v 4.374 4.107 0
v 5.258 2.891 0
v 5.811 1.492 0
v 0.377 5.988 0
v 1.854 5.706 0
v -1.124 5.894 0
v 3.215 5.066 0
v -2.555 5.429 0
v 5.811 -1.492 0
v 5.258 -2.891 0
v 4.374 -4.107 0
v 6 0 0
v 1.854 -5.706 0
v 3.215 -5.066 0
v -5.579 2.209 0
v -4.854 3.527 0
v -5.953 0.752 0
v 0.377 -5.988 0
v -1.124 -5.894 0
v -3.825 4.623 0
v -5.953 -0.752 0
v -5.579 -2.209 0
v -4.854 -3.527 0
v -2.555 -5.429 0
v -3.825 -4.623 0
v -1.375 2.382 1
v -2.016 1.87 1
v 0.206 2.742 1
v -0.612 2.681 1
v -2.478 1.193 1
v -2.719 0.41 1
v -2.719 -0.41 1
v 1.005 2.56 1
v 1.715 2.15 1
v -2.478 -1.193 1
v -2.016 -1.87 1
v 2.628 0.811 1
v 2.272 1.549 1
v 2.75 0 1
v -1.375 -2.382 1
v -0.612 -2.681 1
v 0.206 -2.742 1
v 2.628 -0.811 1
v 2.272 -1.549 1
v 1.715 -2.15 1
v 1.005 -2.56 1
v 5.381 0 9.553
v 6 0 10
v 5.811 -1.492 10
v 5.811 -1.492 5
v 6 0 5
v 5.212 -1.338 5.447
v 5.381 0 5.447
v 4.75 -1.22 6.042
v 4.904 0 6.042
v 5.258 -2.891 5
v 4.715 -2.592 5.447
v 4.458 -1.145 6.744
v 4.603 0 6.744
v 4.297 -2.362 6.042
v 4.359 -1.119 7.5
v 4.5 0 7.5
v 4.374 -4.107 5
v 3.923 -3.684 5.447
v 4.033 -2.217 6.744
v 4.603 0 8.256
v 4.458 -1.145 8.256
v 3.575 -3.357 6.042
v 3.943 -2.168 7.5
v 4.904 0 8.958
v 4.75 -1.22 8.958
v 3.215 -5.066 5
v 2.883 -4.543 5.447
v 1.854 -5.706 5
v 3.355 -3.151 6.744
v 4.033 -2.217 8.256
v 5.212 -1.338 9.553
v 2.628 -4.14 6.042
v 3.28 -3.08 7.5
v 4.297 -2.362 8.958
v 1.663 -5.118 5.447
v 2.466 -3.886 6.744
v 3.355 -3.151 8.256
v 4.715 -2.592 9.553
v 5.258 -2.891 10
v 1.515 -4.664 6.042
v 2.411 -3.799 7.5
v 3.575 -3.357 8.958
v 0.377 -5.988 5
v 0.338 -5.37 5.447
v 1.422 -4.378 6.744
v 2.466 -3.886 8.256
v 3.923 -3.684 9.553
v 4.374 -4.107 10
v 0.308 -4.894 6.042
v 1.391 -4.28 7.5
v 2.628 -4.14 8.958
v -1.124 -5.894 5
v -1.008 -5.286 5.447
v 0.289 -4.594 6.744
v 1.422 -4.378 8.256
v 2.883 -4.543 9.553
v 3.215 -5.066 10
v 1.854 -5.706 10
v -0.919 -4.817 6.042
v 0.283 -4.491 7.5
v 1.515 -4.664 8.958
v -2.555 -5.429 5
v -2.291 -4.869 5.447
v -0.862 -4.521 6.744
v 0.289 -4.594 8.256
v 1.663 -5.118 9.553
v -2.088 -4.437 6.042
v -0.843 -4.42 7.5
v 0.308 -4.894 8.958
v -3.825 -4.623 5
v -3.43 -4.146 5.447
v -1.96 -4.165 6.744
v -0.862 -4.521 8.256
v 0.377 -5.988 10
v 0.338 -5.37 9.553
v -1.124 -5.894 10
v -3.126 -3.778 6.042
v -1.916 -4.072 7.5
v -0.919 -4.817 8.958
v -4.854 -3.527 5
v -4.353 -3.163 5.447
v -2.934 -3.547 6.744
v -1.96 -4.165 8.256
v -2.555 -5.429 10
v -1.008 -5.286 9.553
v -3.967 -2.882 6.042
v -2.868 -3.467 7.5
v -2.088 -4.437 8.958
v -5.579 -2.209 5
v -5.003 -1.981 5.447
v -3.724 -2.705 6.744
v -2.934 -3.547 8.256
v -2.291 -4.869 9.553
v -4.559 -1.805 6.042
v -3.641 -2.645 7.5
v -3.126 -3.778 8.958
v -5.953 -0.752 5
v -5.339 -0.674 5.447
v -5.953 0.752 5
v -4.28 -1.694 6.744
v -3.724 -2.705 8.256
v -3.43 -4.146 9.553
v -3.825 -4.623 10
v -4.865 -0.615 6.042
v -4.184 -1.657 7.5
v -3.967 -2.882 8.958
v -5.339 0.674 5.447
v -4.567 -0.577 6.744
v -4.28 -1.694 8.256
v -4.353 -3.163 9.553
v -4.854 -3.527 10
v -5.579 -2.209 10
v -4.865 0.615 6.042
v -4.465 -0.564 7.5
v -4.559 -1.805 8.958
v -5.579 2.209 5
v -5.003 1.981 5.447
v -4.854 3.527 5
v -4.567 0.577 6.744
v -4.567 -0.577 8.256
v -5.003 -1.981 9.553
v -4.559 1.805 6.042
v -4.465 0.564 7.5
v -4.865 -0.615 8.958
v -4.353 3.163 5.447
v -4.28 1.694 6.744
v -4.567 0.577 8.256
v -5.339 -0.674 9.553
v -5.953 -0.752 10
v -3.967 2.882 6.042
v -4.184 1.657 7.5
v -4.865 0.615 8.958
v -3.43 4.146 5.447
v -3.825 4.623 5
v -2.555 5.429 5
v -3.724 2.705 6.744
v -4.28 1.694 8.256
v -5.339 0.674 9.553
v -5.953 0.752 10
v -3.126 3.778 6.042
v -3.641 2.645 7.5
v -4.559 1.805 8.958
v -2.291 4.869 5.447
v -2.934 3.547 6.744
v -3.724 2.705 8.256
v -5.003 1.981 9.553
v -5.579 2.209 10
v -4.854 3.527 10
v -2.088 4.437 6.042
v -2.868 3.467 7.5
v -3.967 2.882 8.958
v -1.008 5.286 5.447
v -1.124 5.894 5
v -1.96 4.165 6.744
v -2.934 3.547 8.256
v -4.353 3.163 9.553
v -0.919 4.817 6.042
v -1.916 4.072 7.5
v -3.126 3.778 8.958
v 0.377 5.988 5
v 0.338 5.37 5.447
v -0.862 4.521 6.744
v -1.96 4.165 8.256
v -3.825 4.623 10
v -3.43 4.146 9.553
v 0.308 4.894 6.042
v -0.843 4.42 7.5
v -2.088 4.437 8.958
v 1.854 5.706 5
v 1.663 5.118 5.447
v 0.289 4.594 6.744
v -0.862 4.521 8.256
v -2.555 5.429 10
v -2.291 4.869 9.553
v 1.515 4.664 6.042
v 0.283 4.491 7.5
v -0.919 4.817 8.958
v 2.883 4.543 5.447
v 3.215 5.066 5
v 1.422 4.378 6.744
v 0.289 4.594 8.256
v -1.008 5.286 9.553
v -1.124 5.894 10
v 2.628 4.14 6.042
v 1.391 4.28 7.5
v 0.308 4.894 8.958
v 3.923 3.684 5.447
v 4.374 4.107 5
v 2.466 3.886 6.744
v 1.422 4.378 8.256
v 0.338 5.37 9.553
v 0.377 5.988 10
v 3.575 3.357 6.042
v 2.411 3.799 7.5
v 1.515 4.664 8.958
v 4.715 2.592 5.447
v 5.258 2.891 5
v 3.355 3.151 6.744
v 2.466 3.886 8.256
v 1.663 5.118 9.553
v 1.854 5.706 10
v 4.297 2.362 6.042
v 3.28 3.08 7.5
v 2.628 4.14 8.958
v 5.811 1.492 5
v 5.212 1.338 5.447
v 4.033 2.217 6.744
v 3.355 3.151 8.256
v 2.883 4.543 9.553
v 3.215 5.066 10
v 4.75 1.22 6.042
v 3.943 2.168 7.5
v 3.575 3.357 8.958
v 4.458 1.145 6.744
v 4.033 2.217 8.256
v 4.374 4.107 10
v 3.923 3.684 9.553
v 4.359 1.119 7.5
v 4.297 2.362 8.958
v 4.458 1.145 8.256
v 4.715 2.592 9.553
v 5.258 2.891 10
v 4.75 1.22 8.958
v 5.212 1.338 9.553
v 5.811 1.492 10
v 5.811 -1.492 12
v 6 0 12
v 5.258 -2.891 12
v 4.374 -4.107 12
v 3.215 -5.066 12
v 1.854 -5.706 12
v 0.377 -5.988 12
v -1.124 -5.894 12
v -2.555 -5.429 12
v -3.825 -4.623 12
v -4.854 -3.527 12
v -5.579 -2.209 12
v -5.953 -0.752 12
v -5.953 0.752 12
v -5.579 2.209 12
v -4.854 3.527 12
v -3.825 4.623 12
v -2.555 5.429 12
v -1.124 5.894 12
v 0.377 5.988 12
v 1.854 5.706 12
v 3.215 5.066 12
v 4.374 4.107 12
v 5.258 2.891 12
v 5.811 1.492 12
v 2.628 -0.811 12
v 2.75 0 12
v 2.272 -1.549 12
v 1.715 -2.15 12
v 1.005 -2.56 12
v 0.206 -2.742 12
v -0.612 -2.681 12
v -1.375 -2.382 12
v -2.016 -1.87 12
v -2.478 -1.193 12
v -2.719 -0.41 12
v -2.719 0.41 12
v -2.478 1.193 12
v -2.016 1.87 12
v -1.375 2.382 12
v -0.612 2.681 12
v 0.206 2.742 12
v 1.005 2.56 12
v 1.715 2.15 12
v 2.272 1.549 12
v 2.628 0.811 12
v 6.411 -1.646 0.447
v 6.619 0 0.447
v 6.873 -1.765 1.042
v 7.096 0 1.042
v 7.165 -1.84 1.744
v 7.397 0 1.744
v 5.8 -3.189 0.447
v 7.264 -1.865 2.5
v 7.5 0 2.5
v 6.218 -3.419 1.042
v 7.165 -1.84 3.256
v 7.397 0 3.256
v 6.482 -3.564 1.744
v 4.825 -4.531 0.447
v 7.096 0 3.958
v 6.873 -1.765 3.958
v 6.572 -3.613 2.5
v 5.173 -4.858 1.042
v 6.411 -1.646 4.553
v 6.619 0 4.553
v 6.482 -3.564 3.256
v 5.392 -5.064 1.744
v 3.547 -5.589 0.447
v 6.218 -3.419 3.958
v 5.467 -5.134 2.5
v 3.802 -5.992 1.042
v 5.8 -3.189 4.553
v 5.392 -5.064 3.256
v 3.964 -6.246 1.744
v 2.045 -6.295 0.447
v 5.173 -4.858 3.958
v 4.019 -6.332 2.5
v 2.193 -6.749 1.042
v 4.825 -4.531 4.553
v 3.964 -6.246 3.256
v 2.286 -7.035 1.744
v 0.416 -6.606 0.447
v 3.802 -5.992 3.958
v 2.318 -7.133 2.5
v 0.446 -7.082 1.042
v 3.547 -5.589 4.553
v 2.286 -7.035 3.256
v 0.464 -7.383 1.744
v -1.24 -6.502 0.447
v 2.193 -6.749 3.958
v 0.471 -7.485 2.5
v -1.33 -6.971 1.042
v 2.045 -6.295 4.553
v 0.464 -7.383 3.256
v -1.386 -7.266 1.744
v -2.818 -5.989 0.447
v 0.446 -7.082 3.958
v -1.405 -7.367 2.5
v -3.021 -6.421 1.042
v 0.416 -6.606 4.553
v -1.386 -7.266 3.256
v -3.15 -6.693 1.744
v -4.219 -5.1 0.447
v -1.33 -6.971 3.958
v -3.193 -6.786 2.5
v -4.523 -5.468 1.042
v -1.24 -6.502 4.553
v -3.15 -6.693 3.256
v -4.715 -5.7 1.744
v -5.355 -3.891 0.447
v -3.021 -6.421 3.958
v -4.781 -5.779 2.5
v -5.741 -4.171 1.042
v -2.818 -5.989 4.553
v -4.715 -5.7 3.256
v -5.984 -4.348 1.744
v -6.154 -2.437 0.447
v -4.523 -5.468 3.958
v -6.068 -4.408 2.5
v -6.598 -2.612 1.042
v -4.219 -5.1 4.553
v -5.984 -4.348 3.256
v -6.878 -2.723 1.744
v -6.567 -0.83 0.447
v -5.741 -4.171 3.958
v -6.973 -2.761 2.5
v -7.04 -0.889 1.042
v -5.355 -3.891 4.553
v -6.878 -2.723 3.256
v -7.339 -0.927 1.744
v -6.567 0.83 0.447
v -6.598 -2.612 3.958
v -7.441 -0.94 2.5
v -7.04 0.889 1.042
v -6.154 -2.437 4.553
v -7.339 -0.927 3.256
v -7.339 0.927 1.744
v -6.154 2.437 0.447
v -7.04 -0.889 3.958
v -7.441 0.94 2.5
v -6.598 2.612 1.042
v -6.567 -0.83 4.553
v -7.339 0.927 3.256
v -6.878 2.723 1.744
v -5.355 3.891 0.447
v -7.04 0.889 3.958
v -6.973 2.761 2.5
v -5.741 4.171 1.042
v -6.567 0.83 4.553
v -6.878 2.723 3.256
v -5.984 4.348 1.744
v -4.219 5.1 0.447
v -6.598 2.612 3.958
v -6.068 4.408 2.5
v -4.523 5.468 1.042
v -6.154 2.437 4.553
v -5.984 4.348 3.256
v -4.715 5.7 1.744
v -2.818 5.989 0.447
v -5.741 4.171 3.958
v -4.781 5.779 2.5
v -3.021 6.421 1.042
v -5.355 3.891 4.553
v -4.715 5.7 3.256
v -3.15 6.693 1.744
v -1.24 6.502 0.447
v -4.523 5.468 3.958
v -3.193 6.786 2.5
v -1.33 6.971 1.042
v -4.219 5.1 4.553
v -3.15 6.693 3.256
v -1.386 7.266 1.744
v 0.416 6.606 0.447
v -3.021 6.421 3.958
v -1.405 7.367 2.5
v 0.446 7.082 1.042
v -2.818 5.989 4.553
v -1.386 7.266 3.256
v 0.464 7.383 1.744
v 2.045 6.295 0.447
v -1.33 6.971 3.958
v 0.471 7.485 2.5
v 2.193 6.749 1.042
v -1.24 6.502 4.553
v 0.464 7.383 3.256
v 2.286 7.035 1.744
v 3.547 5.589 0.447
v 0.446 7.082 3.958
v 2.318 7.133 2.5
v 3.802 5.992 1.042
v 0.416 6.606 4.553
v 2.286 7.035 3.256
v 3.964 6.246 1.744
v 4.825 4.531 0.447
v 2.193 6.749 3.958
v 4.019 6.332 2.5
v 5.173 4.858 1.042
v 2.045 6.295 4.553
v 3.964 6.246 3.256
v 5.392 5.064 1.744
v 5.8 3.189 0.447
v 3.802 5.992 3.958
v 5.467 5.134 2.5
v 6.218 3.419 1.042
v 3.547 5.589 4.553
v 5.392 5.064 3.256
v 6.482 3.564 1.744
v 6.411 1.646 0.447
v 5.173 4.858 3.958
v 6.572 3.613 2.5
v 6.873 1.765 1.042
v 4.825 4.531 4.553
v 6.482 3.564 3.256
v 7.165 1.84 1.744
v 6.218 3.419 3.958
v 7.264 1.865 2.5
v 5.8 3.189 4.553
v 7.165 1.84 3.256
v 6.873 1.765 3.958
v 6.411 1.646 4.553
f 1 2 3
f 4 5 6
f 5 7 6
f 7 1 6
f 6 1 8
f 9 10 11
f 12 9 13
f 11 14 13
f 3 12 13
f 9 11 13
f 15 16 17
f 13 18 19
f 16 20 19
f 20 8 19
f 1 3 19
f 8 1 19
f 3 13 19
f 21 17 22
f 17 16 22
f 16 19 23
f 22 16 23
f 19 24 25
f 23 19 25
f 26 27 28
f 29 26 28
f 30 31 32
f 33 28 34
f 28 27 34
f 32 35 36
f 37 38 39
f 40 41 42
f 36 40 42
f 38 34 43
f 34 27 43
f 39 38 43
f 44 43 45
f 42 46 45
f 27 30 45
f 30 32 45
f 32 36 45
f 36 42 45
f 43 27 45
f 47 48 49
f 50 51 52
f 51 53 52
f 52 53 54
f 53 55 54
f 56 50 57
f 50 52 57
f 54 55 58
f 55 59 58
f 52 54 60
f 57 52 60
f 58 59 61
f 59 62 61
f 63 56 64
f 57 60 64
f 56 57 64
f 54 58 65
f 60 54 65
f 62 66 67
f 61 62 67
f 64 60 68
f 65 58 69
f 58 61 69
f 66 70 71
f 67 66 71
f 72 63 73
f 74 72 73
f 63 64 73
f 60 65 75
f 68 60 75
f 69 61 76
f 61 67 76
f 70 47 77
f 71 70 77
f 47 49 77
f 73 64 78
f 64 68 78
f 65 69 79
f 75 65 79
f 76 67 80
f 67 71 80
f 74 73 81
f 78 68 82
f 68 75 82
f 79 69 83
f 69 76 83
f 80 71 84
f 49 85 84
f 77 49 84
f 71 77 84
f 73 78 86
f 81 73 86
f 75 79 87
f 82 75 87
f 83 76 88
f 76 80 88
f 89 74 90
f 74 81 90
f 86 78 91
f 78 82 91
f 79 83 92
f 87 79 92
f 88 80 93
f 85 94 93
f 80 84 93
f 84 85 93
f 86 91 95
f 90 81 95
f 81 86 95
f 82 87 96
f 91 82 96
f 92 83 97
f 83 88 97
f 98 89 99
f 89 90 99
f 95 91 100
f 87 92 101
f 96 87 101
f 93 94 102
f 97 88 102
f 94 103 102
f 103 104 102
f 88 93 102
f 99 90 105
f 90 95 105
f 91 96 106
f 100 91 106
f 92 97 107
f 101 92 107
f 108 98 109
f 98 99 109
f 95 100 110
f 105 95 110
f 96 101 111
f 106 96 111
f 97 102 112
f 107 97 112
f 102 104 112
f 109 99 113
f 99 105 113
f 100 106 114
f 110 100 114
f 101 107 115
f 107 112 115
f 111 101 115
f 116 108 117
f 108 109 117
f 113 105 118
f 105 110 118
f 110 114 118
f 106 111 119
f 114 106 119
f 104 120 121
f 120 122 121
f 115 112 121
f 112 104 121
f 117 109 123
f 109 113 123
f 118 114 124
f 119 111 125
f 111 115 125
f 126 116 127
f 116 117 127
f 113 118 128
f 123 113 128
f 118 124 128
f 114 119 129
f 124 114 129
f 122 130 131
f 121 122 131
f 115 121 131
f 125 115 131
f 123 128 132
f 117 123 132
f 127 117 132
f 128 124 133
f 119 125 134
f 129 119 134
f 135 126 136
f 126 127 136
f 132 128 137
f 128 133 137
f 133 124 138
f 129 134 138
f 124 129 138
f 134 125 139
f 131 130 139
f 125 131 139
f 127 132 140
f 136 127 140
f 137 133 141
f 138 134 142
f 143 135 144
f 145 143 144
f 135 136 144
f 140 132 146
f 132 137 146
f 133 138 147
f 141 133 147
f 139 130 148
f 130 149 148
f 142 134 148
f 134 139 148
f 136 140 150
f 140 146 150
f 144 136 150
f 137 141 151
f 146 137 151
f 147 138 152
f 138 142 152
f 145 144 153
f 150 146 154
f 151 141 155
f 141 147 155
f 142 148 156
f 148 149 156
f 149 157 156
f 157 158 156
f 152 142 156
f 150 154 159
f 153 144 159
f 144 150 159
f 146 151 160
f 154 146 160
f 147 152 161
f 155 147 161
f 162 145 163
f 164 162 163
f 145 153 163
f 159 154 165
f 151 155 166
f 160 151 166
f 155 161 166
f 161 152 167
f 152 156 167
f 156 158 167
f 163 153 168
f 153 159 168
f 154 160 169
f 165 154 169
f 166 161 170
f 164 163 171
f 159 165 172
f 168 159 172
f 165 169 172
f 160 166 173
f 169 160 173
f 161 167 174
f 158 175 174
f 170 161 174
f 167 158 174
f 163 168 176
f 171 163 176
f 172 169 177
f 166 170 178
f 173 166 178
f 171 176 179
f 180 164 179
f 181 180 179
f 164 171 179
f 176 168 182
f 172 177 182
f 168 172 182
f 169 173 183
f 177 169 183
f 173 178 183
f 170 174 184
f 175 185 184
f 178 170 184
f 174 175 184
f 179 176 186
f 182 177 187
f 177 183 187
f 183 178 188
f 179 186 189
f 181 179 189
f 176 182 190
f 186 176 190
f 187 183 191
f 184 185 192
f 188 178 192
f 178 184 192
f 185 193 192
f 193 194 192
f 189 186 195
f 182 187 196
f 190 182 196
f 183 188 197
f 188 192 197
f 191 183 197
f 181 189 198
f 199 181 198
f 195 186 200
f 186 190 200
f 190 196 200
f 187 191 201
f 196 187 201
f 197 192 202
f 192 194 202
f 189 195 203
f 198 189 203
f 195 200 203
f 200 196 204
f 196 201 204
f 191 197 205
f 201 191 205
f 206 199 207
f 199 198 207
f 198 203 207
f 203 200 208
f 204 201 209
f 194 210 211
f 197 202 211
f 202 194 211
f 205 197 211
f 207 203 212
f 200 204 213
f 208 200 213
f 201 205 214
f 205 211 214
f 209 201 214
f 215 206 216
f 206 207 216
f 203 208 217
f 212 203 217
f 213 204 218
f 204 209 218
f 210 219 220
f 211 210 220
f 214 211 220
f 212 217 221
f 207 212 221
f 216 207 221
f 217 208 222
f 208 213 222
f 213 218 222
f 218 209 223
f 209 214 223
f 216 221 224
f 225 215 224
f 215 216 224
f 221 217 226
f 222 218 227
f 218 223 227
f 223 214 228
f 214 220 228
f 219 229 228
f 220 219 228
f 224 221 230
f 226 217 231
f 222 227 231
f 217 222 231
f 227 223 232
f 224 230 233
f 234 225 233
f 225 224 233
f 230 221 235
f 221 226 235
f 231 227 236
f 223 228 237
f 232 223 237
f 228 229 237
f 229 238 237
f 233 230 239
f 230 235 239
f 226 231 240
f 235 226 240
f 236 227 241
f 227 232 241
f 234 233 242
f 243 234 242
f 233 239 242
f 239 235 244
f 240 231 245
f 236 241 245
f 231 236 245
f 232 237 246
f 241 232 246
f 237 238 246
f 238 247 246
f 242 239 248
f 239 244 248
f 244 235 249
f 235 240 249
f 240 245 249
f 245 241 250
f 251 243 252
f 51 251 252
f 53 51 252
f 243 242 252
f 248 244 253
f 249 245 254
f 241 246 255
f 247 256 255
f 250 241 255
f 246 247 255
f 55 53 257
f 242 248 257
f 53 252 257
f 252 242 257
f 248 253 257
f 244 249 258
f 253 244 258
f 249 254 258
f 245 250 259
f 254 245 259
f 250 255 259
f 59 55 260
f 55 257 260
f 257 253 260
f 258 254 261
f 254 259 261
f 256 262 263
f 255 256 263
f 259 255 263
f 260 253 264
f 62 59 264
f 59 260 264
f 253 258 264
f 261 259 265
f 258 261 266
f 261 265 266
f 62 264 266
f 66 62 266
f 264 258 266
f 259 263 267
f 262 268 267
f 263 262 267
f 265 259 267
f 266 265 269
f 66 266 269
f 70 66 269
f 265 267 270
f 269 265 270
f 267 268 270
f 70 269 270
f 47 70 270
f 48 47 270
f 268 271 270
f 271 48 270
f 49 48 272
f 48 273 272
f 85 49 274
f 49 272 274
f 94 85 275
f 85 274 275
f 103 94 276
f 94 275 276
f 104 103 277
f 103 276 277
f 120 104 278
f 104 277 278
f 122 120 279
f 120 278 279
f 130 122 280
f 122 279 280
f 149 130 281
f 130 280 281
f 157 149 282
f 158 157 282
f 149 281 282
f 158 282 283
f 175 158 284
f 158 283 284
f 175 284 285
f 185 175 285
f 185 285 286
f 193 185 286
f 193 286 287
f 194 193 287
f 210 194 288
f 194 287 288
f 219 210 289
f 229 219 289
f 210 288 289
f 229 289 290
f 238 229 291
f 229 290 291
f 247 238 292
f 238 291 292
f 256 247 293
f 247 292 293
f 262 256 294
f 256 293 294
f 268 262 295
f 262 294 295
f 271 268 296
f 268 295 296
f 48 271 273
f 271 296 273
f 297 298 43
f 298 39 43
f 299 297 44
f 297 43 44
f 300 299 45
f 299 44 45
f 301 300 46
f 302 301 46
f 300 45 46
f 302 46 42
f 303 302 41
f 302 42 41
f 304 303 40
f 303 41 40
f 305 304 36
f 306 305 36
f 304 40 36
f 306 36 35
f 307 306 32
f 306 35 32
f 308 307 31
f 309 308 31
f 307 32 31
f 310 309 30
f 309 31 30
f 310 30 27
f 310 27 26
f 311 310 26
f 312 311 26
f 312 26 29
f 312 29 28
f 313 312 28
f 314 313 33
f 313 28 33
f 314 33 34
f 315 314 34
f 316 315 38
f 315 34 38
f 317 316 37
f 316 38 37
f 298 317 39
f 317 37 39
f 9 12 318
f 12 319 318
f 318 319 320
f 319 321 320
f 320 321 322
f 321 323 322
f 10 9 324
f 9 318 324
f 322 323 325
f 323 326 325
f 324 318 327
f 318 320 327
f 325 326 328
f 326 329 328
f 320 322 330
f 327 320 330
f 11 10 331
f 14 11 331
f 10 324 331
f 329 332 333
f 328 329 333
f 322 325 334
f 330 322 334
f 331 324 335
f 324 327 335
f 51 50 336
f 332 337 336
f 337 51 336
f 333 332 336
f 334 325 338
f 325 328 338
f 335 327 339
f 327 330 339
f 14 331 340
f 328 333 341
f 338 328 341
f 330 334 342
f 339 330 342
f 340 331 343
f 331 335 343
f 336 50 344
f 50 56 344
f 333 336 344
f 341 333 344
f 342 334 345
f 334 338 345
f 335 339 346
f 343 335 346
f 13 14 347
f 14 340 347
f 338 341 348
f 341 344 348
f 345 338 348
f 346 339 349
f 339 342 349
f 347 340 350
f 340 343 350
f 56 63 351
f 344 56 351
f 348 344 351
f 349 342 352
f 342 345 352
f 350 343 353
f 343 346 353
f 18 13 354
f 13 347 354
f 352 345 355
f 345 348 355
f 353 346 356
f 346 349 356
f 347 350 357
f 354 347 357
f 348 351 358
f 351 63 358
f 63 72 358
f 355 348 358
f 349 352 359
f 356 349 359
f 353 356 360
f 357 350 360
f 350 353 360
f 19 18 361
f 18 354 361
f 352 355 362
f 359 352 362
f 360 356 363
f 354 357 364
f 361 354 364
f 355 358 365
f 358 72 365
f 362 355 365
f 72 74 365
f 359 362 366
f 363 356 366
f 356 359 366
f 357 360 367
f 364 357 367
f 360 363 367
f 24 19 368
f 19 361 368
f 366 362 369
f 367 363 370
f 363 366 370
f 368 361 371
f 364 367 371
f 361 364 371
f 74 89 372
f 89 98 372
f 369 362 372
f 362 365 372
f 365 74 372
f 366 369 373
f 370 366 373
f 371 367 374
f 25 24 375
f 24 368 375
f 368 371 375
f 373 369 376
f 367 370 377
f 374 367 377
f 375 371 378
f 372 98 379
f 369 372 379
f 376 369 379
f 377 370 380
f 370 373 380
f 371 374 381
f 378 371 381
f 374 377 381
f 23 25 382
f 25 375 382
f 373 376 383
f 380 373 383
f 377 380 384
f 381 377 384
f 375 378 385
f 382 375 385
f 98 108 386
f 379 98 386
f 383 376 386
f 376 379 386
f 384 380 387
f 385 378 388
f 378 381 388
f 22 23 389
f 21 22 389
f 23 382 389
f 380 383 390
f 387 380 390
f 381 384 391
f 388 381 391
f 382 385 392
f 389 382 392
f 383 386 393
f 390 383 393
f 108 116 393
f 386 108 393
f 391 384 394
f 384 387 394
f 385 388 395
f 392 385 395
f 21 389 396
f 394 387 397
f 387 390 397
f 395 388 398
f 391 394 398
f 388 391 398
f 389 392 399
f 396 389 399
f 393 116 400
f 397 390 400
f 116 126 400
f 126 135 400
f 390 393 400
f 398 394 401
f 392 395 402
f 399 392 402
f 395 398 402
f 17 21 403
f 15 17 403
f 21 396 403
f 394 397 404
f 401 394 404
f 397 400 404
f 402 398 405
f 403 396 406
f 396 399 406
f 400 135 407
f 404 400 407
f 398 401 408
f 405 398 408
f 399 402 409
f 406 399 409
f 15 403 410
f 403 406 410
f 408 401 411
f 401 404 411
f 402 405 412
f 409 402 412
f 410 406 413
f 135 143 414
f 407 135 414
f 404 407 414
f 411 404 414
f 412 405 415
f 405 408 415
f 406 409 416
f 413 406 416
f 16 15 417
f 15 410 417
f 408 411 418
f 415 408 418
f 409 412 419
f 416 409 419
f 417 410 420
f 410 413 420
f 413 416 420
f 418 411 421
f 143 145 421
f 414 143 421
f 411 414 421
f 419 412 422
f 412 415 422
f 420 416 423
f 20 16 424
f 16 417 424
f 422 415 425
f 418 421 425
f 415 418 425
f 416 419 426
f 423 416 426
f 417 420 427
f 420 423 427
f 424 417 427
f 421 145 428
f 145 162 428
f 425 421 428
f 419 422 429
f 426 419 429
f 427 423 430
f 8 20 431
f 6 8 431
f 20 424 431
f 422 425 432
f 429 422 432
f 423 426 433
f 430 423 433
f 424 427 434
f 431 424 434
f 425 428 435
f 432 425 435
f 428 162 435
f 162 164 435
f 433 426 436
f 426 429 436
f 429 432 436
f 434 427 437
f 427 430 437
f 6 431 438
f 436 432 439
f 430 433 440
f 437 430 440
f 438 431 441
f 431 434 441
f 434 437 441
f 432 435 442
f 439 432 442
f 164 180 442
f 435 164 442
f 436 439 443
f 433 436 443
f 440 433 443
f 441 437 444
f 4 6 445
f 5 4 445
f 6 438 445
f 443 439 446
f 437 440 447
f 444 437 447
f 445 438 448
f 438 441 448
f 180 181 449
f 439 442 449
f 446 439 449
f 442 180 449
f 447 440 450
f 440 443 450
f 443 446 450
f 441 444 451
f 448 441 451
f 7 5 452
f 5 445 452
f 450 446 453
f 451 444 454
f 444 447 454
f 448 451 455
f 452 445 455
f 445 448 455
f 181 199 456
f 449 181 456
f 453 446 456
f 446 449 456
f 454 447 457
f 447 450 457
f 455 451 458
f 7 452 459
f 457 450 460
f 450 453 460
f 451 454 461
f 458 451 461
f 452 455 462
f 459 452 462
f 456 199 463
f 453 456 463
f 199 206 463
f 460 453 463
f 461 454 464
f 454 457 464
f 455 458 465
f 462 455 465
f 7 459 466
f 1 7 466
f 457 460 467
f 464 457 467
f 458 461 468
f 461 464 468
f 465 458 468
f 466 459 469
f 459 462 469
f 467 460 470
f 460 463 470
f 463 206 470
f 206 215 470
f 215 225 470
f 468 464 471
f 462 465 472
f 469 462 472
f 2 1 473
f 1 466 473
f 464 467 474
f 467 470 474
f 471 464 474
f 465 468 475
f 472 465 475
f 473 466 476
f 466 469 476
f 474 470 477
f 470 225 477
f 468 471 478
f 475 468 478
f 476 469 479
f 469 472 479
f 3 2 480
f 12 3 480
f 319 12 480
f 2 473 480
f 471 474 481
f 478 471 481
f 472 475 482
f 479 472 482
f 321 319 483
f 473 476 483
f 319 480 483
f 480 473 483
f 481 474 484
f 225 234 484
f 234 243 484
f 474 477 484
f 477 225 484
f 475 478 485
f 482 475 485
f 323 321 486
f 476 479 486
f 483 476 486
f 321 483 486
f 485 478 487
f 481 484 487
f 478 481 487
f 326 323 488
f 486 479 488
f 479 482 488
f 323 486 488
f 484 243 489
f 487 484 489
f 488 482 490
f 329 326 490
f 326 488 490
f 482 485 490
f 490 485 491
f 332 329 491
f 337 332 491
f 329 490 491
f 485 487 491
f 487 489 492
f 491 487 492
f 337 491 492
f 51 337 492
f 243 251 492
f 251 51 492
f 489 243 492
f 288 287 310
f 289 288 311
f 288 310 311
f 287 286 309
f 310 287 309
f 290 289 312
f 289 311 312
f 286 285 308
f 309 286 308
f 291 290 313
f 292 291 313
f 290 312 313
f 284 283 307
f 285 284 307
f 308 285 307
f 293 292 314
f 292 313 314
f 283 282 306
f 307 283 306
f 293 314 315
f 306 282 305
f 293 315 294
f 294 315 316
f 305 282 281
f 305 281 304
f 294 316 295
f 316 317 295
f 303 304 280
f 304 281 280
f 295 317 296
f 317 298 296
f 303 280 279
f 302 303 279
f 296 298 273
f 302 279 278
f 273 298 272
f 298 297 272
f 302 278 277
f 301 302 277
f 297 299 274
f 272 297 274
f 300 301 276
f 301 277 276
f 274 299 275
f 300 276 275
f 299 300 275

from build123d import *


with BuildPart() as f1:
    # F0 (on Front) → F1 (revolve)
    with BuildSketch(Plane.XZ):
        with BuildLine():
            Line((0, 1), (0, 0))
            Line((0, 0), (6, 0))
            ThreePointArc((6, 0), (7.5, 2.5), (6, 5))
            ThreePointArc((6, 5), (4.5, 7.5), (6, 10))
            Line((6, 10), (6, 12))
            Line((6, 12), (2.75, 12))
            Line((2.75, 12), (2.75, 1))
            Line((2.75, 1), (0, 1))
        make_face()
    revolve(axis=Axis((0, 0, 0.5), (0, 0, -1)))


solid = f1.part
